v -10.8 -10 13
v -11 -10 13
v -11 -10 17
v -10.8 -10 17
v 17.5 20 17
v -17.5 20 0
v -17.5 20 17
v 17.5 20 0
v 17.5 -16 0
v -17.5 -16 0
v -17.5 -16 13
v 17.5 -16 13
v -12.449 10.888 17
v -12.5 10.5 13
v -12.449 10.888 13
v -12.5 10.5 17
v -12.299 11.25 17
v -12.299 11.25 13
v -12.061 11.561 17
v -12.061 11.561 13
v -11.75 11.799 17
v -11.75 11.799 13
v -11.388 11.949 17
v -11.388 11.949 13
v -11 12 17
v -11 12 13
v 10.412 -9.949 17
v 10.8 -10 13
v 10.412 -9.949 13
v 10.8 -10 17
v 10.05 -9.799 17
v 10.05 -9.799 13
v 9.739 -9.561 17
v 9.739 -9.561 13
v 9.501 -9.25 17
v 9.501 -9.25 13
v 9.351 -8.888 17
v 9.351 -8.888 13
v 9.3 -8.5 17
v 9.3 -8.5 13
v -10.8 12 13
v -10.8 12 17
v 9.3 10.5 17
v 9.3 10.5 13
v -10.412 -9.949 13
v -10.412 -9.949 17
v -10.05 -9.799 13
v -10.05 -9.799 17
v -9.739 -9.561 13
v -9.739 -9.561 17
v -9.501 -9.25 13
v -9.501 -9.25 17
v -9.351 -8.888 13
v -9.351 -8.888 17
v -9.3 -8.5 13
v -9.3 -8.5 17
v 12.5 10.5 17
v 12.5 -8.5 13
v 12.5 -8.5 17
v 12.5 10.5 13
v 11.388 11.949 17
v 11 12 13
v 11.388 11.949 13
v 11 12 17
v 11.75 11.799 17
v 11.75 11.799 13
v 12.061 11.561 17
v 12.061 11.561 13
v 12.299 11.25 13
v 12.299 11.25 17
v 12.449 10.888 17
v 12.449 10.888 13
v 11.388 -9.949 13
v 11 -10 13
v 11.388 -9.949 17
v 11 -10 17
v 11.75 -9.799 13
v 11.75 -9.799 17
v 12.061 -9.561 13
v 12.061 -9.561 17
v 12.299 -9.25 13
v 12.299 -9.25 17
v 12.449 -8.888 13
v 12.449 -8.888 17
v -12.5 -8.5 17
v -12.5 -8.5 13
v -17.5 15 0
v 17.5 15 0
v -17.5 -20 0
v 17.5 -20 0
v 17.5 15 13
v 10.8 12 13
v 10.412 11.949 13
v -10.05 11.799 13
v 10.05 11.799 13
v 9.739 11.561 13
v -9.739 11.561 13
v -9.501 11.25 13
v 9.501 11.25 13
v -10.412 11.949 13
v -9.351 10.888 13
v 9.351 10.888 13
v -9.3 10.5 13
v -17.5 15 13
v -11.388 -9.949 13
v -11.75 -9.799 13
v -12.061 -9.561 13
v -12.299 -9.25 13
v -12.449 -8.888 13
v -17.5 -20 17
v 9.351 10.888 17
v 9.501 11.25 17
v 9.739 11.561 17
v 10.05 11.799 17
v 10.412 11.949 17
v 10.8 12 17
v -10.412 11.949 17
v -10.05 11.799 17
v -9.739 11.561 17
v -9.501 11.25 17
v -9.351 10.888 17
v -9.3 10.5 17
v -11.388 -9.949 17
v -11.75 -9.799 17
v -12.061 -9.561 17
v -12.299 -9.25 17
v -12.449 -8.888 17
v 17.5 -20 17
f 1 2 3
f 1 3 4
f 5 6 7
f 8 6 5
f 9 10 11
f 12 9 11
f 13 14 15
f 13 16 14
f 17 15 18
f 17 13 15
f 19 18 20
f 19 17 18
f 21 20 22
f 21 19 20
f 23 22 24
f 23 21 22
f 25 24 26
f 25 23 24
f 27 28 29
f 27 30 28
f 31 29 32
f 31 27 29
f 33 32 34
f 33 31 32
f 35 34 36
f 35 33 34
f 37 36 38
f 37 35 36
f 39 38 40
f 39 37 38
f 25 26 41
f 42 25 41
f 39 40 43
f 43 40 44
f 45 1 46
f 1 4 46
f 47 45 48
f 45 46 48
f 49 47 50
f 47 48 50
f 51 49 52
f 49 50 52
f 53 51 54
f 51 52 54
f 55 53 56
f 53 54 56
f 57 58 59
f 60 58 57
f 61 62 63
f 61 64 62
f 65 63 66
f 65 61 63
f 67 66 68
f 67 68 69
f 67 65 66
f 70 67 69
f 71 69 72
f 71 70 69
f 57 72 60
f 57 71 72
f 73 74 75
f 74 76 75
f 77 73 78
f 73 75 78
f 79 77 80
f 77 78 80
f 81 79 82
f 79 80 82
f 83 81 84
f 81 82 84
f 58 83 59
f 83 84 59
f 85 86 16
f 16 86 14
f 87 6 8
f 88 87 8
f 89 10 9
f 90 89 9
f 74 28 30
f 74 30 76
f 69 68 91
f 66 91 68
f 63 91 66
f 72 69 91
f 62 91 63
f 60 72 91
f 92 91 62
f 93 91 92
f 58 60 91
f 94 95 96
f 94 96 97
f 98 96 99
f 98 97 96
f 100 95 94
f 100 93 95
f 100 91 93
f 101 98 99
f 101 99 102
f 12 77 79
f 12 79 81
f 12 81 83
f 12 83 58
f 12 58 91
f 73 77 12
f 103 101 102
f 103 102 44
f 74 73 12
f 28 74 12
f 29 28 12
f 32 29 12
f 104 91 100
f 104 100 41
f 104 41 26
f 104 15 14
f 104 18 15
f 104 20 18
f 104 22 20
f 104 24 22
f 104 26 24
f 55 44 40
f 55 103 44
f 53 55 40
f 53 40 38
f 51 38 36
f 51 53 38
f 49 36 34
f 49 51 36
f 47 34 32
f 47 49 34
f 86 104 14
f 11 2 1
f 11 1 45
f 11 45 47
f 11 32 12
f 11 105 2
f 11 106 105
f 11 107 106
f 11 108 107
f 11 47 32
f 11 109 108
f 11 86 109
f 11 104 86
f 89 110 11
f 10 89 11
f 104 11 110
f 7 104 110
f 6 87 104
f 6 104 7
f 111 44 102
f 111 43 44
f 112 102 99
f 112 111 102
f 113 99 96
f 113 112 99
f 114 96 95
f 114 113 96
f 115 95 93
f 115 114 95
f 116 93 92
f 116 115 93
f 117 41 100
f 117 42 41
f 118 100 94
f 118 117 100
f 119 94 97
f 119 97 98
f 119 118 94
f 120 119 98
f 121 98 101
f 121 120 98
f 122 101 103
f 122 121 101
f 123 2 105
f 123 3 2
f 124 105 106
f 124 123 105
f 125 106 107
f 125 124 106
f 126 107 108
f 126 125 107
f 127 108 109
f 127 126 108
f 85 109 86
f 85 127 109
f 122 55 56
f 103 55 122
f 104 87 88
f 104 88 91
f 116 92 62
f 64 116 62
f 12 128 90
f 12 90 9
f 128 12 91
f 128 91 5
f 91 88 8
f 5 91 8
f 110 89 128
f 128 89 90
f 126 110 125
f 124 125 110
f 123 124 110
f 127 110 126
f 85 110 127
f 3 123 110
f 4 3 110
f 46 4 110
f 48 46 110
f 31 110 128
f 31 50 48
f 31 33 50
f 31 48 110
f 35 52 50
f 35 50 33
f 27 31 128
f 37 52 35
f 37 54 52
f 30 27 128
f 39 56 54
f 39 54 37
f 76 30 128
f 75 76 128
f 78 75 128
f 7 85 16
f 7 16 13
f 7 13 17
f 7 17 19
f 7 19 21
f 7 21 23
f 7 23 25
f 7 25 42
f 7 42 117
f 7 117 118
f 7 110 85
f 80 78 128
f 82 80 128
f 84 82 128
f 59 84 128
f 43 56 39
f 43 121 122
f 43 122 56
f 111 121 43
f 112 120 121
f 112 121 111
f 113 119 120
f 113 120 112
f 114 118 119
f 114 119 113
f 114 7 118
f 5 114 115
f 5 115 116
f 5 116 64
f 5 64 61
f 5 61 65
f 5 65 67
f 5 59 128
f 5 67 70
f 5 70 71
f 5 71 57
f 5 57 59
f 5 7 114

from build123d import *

# Parameters (mm, degrees)
F0_W     = 35
F0_H     = 40
F0_W_2   = 3.2
F0_H_2   = 22
F1_DEPTH = 17
F2_W     = 31
F2_H     = 13
F3_DEPTH = 35.001
F4_R     = 1.5


with BuildPart() as f1:
    # F0 (on Top) → F1 (new body)
    with BuildSketch(Plane.XY):
        Rectangle(F0_W, F0_H)
        with Locations((-10.9, 1)):
            Rectangle(F0_W_2, F0_H_2, mode=Mode.SUBTRACT)
        with Locations((10.9, 1)):
            Rectangle(F0_W_2, F0_H_2, mode=Mode.SUBTRACT)
    extrude(amount=F1_DEPTH)

    # F2 (on face) → F3 (cut, through all)
    with BuildSketch(Plane(origin=(-17.5, 0, 0), x_dir=(0, -1, 0), z_dir=(-1, 0, 0))):
        with Locations((0.5, 6.5)):
            Rectangle(F2_W, F2_H)
    extrude(amount=-F3_DEPTH, mode=Mode.SUBTRACT)

    # F4
    f4_edges = [f1.edges().sort_by_distance(p)[0] for p in [
        (-9.3, 12, 15),
        (-12.5, 12, 15),
        (-12.5, -10, 15),
        (-9.3, -10, 15),
        (9.3, -10, 15),
        (12.5, -10, 15),
        (9.3, 12, 15),
        (12.5, 12, 15),
    ]]
    fillet(f4_edges, radius=F4_R)


solid = f1.part
